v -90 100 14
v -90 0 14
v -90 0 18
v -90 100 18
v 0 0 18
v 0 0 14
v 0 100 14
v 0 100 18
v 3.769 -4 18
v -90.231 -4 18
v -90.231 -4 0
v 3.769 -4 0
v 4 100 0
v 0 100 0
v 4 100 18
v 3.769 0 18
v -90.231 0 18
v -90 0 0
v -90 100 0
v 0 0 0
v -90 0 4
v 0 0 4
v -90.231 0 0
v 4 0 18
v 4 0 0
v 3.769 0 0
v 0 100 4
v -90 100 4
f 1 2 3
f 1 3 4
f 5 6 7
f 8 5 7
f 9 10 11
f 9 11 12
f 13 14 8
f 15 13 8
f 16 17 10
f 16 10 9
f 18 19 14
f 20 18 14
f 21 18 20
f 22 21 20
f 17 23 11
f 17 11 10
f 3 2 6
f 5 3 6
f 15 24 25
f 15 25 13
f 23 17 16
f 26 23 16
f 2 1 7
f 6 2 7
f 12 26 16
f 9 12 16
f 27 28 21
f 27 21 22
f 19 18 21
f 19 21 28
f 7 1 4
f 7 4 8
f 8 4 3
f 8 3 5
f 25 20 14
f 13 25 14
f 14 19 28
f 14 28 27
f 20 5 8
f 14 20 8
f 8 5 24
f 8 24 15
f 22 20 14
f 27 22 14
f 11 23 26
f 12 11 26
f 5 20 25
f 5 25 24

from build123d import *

# Parameters (mm, degrees)
F0_W     = 90
F0_H     = 100
F1_DEPTH = 4
F3_W     = 90
F3_H     = 100
F4_DEPTH = 4
F5_W     = 100
F5_H     = 18
F6_DEPTH = 4
F7_W     = 94
F7_H     = 18
F8_DEPTH = 4


with BuildPart() as f1:
    # F0 (on Top) → F1 (new body)
    with BuildSketch(Plane.XY):
        with Locations((-45, 50)):
            Rectangle(F0_W, F0_H)
    extrude(amount=F1_DEPTH)


with BuildPart() as f4:
    # F3 (on offset) → F4 (new body)
    with BuildSketch(Plane.XY.offset(14)):
        with Locations((-45, 50)):
            Rectangle(F3_W, F3_H)
    extrude(amount=F4_DEPTH)


with BuildPart() as f6:
    # F5 (on Right) → F6 (new body)
    with BuildSketch(Plane.YZ):
        with Locations((50, 9)):
            Rectangle(F5_W, F5_H)
    extrude(amount=F6_DEPTH)


with BuildPart() as f8:
    # F7 (on Front) → F8 (new body)
    with BuildSketch(Plane.XZ):
        with Locations((-43.2305304807, 9)):
            Rectangle(F7_W, F7_H)
    extrude(amount=F8_DEPTH)


solid = Compound([f1.part, f4.part, f6.part, f8.part])
